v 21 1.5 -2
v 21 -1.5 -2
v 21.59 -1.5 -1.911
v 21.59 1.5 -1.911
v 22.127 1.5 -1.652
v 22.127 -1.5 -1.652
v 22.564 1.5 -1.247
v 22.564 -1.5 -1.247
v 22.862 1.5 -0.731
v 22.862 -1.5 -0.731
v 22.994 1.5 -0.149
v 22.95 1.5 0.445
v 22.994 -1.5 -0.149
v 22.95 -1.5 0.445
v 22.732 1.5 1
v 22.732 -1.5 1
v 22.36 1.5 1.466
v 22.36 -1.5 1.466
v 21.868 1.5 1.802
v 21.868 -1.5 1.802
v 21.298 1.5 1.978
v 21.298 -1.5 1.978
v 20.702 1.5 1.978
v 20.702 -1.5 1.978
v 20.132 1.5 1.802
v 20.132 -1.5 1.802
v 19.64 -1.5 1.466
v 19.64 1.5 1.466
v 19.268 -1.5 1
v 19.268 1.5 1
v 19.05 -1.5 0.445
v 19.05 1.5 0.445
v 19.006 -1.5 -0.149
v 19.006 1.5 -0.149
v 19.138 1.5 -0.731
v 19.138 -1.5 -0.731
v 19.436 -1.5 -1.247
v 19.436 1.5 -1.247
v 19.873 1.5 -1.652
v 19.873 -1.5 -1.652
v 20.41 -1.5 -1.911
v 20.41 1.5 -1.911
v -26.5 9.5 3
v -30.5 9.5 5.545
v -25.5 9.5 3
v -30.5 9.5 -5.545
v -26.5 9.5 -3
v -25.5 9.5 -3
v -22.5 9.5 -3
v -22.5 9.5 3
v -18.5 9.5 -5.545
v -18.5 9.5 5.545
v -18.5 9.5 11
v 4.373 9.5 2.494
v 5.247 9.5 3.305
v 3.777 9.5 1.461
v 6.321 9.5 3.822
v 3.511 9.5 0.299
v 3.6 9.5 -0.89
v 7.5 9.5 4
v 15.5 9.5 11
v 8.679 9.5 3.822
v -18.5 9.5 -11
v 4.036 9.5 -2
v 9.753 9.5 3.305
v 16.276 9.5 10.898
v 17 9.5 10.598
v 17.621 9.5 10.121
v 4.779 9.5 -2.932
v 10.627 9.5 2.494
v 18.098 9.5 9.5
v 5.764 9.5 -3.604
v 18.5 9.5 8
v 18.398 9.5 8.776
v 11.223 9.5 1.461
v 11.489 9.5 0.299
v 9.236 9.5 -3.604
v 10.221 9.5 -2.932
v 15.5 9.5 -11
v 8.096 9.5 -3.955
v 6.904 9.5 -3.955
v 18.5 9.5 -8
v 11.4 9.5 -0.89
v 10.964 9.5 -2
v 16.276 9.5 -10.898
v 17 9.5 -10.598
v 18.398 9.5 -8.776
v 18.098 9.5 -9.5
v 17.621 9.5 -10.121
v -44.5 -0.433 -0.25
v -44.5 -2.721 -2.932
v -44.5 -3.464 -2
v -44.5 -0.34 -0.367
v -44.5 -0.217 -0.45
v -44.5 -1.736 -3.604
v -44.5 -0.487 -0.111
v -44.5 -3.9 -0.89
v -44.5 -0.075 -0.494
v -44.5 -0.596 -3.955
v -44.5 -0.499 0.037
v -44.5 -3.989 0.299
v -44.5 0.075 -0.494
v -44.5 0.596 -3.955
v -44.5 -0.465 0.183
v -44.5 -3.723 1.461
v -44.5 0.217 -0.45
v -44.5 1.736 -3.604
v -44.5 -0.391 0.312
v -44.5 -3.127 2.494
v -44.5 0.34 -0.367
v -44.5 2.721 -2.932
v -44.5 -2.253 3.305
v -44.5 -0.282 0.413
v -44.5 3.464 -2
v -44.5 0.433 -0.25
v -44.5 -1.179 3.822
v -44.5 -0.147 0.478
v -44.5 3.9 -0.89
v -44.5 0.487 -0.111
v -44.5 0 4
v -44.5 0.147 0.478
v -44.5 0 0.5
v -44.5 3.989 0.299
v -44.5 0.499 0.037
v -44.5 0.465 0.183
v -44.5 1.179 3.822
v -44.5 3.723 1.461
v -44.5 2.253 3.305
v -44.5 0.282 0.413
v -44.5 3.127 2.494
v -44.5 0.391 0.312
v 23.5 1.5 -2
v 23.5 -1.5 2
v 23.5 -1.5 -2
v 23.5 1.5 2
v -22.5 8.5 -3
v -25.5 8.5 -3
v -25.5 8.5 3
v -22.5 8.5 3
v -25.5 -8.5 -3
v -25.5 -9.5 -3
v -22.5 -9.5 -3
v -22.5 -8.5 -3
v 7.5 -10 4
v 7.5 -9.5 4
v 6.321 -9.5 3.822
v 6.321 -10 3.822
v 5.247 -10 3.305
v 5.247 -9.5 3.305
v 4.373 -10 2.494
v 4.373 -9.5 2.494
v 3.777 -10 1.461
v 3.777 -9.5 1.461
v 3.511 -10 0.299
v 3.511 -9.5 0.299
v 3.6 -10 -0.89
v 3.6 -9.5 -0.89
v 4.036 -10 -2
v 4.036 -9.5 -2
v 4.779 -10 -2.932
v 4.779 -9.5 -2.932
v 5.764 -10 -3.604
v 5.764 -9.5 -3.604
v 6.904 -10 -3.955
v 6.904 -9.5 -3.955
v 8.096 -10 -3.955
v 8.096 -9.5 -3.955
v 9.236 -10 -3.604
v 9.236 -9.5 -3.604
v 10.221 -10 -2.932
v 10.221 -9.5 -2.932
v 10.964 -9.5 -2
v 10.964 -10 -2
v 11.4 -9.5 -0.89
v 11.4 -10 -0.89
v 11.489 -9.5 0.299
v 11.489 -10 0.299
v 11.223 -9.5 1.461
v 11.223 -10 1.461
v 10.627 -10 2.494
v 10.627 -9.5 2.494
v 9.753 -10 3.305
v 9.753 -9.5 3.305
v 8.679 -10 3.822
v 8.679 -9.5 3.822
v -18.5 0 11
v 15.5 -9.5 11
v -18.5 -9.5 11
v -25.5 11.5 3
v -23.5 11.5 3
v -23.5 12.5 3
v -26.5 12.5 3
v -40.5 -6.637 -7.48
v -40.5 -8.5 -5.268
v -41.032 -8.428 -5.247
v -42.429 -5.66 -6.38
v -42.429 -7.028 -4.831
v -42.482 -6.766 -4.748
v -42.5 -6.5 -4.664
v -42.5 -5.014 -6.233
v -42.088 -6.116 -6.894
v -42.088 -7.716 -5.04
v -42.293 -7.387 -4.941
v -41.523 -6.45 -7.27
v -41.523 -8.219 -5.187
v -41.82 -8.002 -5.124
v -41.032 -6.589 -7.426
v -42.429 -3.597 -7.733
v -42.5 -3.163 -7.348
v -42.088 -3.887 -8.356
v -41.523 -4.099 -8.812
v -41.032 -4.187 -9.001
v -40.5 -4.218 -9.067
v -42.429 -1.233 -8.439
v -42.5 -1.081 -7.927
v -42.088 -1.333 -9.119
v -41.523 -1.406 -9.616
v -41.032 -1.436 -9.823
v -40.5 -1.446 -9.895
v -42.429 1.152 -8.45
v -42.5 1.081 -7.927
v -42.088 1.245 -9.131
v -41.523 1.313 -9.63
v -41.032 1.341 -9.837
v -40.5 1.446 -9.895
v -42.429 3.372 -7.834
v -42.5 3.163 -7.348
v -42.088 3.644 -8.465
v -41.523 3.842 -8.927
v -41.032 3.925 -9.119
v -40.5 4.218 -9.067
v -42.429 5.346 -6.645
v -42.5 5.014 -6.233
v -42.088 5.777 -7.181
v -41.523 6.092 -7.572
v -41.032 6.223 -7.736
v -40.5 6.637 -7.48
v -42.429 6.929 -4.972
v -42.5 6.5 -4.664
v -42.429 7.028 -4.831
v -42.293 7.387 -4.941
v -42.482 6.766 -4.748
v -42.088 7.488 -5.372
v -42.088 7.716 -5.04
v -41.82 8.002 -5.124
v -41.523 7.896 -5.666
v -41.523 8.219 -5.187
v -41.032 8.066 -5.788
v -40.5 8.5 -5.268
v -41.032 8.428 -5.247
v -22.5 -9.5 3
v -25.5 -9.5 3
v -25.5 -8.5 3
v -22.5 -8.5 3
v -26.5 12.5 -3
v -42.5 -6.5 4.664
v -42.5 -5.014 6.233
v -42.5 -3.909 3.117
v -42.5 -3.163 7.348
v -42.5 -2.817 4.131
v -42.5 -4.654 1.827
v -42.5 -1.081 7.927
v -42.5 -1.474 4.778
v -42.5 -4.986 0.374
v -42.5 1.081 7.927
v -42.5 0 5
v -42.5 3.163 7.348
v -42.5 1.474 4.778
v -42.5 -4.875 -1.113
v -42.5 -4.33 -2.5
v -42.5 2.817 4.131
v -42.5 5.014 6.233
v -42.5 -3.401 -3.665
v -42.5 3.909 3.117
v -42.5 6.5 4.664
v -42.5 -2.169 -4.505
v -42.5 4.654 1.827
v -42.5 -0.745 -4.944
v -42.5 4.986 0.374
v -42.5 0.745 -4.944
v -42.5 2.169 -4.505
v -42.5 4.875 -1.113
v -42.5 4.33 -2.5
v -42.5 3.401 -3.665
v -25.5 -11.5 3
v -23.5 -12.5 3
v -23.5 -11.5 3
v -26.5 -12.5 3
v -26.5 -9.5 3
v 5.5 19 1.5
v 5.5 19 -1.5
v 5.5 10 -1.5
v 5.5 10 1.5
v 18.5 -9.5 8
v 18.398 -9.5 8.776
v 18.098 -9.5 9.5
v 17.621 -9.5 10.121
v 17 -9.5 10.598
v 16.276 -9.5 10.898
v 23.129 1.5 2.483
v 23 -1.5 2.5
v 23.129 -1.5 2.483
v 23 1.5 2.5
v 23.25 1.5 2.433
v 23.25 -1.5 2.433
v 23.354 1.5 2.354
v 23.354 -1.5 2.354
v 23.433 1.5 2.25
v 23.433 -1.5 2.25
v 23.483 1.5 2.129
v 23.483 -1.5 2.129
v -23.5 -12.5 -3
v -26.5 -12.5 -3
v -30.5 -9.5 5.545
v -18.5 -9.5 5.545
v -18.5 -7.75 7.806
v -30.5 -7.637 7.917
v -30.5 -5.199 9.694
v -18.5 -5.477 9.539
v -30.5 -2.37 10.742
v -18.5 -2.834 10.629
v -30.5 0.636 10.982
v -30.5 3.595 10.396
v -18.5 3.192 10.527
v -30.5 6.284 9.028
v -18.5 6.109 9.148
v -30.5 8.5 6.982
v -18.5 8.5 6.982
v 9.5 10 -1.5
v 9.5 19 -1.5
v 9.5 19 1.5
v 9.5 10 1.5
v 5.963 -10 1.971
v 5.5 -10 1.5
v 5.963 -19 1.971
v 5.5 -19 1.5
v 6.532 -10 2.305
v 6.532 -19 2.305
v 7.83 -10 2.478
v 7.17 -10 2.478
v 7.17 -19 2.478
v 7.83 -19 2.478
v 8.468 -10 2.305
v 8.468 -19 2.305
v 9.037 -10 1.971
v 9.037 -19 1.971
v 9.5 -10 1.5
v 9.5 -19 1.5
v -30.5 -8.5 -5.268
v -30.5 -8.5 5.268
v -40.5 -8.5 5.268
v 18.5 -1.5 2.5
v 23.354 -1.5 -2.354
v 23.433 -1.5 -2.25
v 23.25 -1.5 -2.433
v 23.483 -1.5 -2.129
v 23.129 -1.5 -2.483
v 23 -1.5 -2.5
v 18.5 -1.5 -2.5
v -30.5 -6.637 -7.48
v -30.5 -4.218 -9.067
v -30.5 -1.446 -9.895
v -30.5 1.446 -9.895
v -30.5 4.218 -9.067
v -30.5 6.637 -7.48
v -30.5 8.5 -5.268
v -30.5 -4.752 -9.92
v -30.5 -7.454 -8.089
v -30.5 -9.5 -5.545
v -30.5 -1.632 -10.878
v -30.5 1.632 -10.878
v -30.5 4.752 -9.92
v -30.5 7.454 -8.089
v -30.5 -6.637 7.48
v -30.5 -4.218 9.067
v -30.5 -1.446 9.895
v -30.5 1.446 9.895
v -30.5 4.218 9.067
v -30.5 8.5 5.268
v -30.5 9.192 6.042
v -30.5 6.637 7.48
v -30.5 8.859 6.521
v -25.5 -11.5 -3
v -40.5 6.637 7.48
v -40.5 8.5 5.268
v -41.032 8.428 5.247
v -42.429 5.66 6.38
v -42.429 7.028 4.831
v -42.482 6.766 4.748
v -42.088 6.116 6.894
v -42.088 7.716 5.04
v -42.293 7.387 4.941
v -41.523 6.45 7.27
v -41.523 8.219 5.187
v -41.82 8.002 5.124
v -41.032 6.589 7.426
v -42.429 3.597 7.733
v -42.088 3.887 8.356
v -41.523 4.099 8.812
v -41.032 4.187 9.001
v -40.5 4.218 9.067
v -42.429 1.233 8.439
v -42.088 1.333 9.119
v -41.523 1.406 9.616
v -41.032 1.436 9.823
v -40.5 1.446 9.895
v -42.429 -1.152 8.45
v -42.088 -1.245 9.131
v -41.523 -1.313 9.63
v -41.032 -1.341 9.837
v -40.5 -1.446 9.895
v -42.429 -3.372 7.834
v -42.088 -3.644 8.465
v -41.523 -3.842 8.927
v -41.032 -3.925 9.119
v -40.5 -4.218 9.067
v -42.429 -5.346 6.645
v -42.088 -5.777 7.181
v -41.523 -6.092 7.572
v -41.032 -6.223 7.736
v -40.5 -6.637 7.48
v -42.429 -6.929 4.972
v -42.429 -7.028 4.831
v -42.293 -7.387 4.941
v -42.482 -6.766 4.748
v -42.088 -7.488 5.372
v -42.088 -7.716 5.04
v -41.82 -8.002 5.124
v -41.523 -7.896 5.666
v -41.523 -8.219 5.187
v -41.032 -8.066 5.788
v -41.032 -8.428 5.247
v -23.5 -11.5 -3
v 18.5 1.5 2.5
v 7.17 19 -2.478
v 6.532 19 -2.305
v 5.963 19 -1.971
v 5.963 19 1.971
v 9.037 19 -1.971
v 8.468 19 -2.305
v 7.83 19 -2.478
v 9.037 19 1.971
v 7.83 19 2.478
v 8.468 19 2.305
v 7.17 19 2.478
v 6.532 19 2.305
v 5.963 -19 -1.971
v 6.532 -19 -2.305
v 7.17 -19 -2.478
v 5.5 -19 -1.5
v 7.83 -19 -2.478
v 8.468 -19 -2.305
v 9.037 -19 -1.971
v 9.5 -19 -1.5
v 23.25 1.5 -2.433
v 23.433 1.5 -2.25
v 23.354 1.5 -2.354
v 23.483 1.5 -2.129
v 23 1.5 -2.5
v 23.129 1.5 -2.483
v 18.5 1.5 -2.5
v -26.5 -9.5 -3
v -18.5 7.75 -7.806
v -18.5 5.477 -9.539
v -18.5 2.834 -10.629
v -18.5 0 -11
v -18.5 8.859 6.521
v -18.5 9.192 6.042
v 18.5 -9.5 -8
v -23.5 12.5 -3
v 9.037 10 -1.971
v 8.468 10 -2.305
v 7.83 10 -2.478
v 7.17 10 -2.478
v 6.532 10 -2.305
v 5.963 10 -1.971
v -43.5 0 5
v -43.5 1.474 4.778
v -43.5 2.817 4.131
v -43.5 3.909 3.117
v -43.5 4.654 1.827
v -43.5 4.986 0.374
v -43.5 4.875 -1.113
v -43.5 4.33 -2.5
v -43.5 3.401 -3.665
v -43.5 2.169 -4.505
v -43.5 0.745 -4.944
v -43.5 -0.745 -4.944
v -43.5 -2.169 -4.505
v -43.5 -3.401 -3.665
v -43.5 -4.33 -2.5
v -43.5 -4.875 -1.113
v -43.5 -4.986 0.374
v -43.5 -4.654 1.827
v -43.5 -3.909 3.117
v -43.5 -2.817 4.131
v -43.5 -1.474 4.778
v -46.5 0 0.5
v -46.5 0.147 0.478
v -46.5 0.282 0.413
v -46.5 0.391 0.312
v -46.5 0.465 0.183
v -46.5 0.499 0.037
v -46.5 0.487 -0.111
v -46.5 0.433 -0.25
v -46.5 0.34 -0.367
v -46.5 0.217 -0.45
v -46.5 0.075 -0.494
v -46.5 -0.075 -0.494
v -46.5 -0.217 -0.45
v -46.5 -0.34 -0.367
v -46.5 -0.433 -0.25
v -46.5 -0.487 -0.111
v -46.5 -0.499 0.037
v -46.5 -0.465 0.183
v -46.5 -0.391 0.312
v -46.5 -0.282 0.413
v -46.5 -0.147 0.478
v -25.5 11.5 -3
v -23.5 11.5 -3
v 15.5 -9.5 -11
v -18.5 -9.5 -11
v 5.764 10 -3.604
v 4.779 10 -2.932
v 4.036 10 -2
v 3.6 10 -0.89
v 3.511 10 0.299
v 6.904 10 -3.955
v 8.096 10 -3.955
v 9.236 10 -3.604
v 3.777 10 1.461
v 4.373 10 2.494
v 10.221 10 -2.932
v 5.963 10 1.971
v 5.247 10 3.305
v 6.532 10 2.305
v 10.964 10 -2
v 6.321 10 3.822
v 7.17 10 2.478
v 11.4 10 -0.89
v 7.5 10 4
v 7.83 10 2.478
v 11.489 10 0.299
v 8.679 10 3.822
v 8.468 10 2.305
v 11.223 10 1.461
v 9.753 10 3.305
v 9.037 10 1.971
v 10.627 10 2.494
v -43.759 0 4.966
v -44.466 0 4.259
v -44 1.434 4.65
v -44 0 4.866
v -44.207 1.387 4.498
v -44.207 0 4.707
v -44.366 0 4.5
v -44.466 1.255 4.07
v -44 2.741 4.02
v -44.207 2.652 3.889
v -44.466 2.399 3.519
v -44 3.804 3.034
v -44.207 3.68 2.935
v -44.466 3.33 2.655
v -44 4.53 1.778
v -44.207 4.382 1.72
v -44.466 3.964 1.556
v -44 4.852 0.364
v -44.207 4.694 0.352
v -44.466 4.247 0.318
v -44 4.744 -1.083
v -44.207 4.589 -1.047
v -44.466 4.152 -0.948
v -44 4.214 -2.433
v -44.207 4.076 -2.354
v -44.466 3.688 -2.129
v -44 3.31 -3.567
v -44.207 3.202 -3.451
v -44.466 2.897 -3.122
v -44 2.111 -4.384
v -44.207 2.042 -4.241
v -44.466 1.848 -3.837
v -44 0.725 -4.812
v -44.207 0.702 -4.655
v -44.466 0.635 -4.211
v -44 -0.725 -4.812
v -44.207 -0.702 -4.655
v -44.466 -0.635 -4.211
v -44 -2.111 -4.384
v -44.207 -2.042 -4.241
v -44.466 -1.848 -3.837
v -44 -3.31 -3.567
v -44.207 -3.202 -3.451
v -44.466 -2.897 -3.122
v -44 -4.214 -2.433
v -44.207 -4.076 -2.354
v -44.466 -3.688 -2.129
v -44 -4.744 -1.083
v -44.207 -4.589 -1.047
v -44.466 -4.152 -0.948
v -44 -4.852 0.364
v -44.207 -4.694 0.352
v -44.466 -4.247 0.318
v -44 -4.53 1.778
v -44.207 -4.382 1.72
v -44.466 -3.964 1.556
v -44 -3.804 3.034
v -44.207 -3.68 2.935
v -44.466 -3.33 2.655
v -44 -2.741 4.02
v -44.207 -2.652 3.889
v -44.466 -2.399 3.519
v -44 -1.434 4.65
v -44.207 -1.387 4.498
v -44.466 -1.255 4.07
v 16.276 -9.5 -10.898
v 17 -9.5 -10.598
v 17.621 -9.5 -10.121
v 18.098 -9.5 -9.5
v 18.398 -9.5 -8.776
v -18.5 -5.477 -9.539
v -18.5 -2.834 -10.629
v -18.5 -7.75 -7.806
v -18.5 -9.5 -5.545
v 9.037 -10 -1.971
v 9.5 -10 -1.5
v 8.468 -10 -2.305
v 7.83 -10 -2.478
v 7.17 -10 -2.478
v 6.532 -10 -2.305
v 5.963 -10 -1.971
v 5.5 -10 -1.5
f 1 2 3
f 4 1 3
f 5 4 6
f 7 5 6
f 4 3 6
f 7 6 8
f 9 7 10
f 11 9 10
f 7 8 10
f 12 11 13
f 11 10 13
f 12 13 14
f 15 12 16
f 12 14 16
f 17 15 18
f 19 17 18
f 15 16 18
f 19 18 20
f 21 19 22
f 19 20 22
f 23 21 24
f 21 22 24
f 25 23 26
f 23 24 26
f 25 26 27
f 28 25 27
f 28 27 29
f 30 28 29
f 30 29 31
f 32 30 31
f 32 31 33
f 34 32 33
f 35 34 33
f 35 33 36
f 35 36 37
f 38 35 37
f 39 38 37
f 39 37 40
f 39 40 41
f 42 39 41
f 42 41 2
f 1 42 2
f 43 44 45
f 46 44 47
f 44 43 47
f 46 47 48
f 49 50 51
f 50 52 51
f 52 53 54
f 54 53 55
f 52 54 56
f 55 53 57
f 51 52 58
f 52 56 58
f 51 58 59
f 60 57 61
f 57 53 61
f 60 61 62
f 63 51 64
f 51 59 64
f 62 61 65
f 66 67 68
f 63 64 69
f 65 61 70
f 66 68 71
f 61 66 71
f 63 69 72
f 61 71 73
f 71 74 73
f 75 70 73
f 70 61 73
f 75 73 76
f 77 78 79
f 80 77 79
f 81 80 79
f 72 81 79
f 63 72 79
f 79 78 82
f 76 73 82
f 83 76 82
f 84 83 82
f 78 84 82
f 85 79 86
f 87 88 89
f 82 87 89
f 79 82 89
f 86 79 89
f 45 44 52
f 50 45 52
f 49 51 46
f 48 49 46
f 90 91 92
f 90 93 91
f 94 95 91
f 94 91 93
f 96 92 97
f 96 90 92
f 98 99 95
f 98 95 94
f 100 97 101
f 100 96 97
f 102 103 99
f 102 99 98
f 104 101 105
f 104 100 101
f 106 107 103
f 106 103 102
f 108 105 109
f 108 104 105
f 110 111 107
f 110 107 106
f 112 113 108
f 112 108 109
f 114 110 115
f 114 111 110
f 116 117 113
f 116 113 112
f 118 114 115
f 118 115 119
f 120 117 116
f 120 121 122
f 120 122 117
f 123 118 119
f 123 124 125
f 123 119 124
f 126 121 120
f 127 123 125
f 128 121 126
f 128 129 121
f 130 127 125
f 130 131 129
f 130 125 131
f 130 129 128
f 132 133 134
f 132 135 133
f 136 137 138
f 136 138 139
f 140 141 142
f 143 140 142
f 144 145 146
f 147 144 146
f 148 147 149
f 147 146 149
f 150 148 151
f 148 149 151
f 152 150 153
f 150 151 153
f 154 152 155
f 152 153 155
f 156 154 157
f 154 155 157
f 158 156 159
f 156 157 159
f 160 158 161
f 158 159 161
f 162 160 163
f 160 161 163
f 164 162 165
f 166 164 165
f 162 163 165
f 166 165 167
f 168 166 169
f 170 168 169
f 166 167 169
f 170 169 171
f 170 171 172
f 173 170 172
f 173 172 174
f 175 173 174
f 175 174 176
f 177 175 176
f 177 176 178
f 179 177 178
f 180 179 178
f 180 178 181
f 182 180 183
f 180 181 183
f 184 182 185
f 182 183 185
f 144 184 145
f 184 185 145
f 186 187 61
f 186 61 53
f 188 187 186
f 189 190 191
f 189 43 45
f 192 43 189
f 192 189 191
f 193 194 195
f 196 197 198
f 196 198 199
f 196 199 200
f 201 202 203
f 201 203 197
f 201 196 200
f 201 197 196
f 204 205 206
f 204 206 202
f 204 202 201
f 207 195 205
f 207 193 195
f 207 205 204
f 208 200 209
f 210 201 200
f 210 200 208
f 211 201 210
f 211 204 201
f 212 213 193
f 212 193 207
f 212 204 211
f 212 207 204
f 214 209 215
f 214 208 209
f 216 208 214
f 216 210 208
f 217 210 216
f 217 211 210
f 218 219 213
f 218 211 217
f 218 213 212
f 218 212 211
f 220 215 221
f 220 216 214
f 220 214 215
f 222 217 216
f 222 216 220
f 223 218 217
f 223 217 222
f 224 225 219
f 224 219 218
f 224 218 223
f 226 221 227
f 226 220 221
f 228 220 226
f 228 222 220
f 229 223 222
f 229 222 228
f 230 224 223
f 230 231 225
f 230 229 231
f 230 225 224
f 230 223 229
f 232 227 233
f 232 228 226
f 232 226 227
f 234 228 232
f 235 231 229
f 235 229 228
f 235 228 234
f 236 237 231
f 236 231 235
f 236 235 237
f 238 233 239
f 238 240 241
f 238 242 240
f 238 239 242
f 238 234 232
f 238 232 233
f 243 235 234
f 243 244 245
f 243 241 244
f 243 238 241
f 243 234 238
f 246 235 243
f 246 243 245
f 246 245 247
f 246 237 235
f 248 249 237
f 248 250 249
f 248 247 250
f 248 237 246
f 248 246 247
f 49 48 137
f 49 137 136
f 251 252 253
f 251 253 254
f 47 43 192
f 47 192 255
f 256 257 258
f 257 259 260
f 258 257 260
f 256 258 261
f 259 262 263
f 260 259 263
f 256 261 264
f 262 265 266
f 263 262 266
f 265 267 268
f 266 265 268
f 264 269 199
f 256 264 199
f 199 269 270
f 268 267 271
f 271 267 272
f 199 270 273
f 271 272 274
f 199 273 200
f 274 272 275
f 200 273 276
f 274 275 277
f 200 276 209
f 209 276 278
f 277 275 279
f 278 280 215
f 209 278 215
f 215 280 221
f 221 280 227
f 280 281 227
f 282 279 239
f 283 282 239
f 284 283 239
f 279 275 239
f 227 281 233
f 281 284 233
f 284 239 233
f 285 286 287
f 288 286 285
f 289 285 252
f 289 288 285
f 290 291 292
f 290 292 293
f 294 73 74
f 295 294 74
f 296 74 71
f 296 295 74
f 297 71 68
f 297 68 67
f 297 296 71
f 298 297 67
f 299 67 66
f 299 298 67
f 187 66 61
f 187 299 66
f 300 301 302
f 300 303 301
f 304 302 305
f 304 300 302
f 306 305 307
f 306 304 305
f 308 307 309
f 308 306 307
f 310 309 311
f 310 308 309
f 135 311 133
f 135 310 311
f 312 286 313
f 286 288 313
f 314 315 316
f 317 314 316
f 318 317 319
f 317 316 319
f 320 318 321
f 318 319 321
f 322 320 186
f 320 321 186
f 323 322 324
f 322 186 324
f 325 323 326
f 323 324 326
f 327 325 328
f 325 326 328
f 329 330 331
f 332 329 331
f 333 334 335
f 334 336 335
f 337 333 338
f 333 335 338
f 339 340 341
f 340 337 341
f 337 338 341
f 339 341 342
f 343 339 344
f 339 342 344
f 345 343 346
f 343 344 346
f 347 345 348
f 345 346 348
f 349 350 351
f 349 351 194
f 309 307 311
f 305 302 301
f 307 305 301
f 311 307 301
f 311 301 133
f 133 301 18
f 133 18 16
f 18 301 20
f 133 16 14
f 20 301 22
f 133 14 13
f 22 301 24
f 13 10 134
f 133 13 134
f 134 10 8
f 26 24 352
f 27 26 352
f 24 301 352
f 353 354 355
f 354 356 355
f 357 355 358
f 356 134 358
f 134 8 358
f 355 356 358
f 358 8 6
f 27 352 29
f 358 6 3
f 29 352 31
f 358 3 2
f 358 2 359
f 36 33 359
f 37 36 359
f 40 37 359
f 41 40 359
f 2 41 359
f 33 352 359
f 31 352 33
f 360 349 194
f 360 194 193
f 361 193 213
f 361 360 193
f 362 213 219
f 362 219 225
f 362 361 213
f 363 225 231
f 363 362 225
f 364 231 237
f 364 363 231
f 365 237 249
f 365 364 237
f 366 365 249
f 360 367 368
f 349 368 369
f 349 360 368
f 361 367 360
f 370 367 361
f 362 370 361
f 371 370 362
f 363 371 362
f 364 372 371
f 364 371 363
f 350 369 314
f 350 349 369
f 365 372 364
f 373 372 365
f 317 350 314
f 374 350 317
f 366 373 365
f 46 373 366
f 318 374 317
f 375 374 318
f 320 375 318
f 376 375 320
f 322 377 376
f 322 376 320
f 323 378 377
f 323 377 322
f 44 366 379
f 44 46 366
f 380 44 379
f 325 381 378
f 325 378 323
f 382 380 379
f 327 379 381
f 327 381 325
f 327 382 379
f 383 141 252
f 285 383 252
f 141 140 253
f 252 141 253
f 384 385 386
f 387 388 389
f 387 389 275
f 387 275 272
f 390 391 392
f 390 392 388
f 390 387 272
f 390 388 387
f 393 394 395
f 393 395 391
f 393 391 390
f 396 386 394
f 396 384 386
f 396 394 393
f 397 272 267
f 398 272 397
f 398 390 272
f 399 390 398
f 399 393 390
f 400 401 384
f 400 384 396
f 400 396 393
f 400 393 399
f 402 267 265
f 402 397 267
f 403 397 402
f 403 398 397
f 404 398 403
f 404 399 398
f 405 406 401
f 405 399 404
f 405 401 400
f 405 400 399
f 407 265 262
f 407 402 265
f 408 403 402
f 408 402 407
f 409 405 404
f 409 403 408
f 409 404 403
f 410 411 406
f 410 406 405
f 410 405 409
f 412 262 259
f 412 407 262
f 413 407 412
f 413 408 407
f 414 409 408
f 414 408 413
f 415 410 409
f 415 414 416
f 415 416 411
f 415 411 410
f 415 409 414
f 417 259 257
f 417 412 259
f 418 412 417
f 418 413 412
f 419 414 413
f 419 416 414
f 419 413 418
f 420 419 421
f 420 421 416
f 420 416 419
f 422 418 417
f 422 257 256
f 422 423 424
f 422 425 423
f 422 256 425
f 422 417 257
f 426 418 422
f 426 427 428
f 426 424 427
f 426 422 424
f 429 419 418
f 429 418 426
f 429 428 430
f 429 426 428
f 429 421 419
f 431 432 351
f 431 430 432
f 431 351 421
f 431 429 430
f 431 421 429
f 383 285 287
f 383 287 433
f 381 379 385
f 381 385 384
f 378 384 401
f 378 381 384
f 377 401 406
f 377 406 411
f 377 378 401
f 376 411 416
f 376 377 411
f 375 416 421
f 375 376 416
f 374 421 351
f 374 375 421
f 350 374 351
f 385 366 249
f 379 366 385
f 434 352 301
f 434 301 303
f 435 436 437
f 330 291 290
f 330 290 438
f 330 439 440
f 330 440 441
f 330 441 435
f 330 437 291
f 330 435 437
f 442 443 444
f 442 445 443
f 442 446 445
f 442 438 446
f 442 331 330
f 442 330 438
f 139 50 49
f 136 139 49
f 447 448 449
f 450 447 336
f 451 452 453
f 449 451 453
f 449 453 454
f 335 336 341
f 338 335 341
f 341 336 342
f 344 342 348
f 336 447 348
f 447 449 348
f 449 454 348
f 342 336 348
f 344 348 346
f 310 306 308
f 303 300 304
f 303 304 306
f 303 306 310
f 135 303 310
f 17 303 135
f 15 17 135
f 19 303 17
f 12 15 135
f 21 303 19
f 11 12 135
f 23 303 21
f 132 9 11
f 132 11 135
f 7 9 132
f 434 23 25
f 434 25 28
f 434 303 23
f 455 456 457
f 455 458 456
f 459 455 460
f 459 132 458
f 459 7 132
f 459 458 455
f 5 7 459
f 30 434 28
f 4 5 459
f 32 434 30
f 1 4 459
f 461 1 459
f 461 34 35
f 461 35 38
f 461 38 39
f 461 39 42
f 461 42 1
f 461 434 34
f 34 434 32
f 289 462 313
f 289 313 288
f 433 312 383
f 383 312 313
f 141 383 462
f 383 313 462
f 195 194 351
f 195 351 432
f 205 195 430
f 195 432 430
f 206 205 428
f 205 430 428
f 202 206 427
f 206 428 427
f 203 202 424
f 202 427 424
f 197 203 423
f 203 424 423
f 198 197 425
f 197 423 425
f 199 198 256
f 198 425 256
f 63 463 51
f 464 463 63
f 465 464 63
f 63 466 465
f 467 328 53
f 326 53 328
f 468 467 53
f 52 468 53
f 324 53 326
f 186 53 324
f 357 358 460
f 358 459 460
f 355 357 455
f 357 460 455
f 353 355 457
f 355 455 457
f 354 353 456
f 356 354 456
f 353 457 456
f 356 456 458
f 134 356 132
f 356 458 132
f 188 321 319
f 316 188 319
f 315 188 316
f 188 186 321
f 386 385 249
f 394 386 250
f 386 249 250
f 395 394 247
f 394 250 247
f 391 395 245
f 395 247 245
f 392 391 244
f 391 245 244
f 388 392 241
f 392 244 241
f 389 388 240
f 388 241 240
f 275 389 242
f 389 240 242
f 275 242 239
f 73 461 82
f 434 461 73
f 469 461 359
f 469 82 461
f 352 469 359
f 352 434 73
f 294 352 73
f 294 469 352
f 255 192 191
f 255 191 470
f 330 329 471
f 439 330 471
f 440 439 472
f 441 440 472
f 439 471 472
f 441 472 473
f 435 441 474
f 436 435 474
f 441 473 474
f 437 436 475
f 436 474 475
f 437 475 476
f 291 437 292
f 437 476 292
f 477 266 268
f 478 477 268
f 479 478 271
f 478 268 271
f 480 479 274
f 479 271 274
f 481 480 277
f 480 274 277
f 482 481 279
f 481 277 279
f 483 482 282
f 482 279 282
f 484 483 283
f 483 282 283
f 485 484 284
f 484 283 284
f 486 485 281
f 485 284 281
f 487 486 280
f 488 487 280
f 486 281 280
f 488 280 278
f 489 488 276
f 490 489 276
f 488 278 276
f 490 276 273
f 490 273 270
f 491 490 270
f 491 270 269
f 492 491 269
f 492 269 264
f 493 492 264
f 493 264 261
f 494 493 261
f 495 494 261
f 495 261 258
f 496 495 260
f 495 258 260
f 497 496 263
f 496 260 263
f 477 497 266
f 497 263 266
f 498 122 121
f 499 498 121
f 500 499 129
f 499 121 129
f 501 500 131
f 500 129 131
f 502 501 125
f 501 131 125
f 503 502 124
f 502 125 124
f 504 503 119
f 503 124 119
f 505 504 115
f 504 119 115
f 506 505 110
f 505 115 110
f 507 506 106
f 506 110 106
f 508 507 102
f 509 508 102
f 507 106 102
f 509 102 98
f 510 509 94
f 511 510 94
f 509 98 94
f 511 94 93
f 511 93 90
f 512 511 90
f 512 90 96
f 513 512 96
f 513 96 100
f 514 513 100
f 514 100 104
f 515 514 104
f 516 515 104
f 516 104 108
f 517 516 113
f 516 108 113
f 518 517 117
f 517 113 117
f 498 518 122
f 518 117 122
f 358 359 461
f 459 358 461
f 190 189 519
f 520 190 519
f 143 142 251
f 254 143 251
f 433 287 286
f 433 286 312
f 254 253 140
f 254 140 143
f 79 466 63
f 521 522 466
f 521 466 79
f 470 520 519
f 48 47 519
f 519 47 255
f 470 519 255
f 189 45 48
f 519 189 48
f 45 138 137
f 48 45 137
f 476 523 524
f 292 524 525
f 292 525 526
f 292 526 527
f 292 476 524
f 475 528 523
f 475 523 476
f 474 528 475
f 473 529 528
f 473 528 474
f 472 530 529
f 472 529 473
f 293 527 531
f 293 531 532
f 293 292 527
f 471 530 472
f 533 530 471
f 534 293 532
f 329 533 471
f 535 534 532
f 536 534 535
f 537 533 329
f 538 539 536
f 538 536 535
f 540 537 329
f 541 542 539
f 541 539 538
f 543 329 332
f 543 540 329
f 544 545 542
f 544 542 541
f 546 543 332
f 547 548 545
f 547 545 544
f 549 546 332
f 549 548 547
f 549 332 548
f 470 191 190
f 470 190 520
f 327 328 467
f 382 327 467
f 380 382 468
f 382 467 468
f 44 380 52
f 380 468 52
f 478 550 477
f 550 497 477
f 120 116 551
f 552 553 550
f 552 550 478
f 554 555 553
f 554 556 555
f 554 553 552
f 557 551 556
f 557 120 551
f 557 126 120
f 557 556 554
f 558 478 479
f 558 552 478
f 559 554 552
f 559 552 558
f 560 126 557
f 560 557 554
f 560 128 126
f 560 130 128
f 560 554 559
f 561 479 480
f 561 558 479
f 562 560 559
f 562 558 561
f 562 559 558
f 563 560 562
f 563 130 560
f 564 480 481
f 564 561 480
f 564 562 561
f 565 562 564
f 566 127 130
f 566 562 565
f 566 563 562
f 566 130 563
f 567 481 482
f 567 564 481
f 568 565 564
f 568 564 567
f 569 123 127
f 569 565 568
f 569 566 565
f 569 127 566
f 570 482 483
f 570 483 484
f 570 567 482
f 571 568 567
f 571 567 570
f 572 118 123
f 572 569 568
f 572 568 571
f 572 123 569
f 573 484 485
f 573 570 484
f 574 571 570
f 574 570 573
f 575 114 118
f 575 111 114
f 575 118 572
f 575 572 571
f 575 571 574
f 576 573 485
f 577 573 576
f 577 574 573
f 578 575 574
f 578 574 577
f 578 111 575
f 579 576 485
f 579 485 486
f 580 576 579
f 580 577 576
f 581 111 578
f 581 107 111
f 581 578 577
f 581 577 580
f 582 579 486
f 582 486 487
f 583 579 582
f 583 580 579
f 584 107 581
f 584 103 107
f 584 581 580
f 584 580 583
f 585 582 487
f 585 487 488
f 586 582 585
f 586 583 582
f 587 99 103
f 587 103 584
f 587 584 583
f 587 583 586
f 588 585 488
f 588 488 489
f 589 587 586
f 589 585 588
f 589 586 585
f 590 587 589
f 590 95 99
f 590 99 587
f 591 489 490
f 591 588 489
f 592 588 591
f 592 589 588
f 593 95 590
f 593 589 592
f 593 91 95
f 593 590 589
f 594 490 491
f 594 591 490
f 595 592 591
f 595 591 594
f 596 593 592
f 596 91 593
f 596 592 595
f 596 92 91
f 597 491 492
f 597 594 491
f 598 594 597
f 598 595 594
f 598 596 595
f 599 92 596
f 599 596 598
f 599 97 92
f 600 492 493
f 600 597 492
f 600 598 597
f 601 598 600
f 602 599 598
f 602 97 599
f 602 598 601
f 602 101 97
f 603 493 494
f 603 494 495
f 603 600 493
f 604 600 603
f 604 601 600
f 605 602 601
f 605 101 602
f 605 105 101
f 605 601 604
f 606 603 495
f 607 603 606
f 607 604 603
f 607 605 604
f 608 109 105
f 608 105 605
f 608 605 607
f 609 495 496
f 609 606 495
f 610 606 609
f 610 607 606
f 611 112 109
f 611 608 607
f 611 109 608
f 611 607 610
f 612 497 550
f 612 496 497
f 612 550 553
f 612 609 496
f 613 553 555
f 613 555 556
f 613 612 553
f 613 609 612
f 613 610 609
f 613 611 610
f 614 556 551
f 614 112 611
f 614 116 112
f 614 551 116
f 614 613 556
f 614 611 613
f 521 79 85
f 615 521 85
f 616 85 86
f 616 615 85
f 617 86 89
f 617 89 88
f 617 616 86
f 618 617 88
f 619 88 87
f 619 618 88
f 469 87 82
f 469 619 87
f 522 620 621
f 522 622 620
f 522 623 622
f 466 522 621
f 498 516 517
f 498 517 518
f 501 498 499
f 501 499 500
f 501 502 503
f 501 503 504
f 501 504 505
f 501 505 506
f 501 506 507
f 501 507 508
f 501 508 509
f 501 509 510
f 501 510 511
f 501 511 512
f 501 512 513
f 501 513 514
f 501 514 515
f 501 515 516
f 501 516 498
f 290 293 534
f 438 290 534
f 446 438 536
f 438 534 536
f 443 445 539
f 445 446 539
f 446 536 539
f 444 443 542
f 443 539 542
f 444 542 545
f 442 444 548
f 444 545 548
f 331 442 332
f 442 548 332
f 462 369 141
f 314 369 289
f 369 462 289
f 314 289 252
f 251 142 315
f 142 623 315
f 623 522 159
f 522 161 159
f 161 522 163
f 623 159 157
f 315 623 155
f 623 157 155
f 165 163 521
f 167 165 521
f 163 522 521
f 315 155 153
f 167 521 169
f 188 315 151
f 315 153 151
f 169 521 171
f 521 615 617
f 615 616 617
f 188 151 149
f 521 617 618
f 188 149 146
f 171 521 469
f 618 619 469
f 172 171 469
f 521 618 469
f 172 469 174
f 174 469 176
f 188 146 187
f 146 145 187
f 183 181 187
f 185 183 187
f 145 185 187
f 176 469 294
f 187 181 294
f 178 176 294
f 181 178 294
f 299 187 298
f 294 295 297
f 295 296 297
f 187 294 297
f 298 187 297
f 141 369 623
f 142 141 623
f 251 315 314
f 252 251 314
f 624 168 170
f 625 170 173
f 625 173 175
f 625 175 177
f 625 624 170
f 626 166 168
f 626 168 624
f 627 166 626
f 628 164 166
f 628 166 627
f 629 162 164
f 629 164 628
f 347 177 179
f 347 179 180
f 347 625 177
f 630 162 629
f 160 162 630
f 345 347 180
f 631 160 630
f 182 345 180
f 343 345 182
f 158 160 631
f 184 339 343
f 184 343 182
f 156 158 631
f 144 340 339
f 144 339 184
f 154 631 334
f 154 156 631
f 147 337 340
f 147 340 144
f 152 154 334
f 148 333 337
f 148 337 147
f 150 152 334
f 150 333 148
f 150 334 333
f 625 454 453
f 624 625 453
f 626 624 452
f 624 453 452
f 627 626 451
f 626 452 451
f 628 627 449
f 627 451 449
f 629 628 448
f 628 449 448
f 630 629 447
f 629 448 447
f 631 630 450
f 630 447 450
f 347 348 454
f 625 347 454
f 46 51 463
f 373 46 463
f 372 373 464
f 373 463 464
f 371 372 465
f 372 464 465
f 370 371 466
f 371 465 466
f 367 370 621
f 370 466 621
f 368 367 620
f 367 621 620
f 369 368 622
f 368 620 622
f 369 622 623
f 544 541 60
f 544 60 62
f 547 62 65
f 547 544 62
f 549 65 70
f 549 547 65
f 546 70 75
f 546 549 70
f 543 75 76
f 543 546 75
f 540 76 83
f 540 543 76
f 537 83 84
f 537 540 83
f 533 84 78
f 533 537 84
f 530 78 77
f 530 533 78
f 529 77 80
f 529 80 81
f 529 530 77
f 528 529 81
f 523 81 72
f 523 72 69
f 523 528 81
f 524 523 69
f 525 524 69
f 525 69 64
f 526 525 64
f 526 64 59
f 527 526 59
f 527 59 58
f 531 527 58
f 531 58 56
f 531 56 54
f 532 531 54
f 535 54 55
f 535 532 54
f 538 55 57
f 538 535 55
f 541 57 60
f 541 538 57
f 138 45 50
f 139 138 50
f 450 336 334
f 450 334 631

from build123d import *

# Parameters (mm, degrees)
Y_KSEKLIK_EKSTR_ZYON1_DEPTH      = 9.5
Y_KSEKLIK_EKSTR_ZYON1_DEPTH_BACK = 9.5
IZIM7_R                          = 2.5
KES_EKSTR_ZYON2_DEPTH            = 19
Y_KSEKLIK_EKSTR_ZYON7_START      = 0.5
IZIM8_R                          = 4
IZIM8_R_2                        = 2.5
Y_KSEKLIK_EKSTR_ZYON7_DEPTH      = 0.5
IZIM9_R                          = 4
IZIM9_R_2                        = 2.5
Y_KSEKLIK_EKSTR_ZYON8_DEPTH      = 0.5
Y_KSEKLIK_EKSTR_ZYON9_DEPTH      = 19
Y_KSEKLIK_EKSTR_ZYON9_DEPTH_BACK = 19
IZIM10_R                         = 2.5
KES_EKSTR_ZYON4_DEPTH            = 9
KES_EKSTR_ZYON5_DEPTH            = 9
IZIM13_W                         = 5
IZIM13_H                         = 3
Y_KSEKLIK_EKSTR_ZYON10_DEPTH     = 5
IZIM14_R                         = 2
KES_EKSTR_ZYON6_DEPTH            = 5
RADYUS3_R                        = 0.5
Y_KSEKLIK_EKSTR_ZYON11_DEPTH     = 12
Y_KSEKLIK_EKSTR_ZYON12_DEPTH     = 19
Y_KSEKLIK_EKSTR_ZYON13_DEPTH     = 5
RADYUS4_R                        = 2
IZIM18_R                         = 5
Y_KSEKLIK_EKSTR_ZYON14_DEPTH     = 2
RADYUS5_R                        = 1
IZIM19_R                         = 0.5
Y_KSEKLIK_EKSTR_ZYON15_DEPTH     = 2
IZIM20_W                         = 3
IZIM20_H                         = 6
KES_EKSTR_ZYON7_DEPTH            = 1
IZIM21_W                         = 3
IZIM21_H                         = 6
KES_EKSTR_ZYON8_DEPTH            = 1
IZIM22_W                         = 1
IZIM22_H                         = 6
Y_KSEKLIK_EKSTR_ZYON17_DEPTH     = 3
IZIM23_W                         = 6
IZIM23_H                         = 1
Y_KSEKLIK_EKSTR_ZYON18_DEPTH     = 2
IZIM24_W                         = 1
IZIM24_H                         = 6
Y_KSEKLIK_EKSTR_ZYON19_DEPTH     = 3
IZIM25_W                         = 6
IZIM25_H                         = 1
Y_KSEKLIK_EKSTR_ZYON20_DEPTH     = 2


with BuildPart() as part:
    # Çizim1 → Yükseklik-Ekstrüzyon1 (new, two sides: drawn at the far end of the back side and taken through both)
    with BuildSketch(Plane(origin=(0, 0, 0), x_dir=(1, 0, 0), z_dir=(0, 1, 0)).offset(-Y_KSEKLIK_EKSTR_ZYON1_DEPTH_BACK)):
        with BuildLine():
            Line((-18.5, 11), (15.5, 11))
            ThreePointArc((15.5, 11), (17.621320344, 10.121320344), (18.5, 8))
            Line((18.5, 8), (18.5, -8))
            ThreePointArc((18.5, -8), (17.621320344, -10.121320344), (15.5, -11))
            Line((15.5, -11), (-18.5, -11))
            Line((-18.5, -11), (-18.5, 11))
        make_face()
    extrude(amount=Y_KSEKLIK_EKSTR_ZYON1_DEPTH + Y_KSEKLIK_EKSTR_ZYON1_DEPTH_BACK)

    # Çizim7 → Kes-Ekstrüzyon2 (cut)
    with BuildSketch(Plane(origin=(0, 9.5, 0), x_dir=(1, 0, 0), z_dir=(0, 1, 0))):
        with Locations(Location((7.5, 0, 0), (0, 0, 270))):
            Circle(IZIM7_R)
    extrude(amount=-KES_EKSTR_ZYON2_DEPTH, mode=Mode.SUBTRACT)

    # Çizim8 → Yükseklik-Ekstrüzyon7 (add)
    with BuildSketch(Plane(origin=(0, 9.5, 0), x_dir=(1, 0, 0), z_dir=(0, 1, 0)).offset(Y_KSEKLIK_EKSTR_ZYON7_START)):
        with Locations(Location((7.5, 0, 0), (0, 0, 270))):
            Circle(IZIM8_R)
        with Locations(Location((7.5, 0, 0), (0, 0, 270))):
            Circle(IZIM8_R_2, mode=Mode.SUBTRACT)
    extrude(amount=-Y_KSEKLIK_EKSTR_ZYON7_DEPTH)

    # Çizim9 → Yükseklik-Ekstrüzyon8 (add)
    with BuildSketch(Plane.XZ.offset(9.5)):
        with Locations(Location((7.5, 0, 0), (0, 0, 90))):
            Circle(IZIM9_R)
        with Locations(Location((7.5, 0, 0), (0, 0, 90))):
            Circle(IZIM9_R_2, mode=Mode.SUBTRACT)
    extrude(amount=Y_KSEKLIK_EKSTR_ZYON8_DEPTH)

    # Çizim10 → Yükseklik-Ekstrüzyon9 (add, two sides: drawn at the far end of the back side and taken through both)
    with BuildSketch(Plane(origin=(0, 0, 0), x_dir=(1, 0, 0), z_dir=(0, 1, 0)).offset(-Y_KSEKLIK_EKSTR_ZYON9_DEPTH_BACK)):
        with Locations(Location((7.5, 0, 0), (0, 0, 270))):
            Circle(IZIM10_R)
    extrude(amount=Y_KSEKLIK_EKSTR_ZYON9_DEPTH + Y_KSEKLIK_EKSTR_ZYON9_DEPTH_BACK)

    # Çizim11 → Kes-Ekstrüzyon4 (cut)
    with BuildSketch(Plane(origin=(0, 19, 0), x_dir=(1, 0, 0), z_dir=(0, 1, 0))):
        with BuildLine():
            Line((5.5, 1.5), (5.5, -1.5))
            ThreePointArc((5.5, -1.5), (5, 0), (5.5, 1.5))
        make_face()
        with BuildLine():
            Line((9.5, 1.5), (9.5, -1.5))
            ThreePointArc((9.5, -1.5), (10, 0), (9.5, 1.5))
        make_face()
    extrude(amount=-KES_EKSTR_ZYON4_DEPTH, mode=Mode.SUBTRACT)

    # Çizim12 → Kes-Ekstrüzyon5 (cut)
    with BuildSketch(Plane.XZ.offset(19)):
        with BuildLine():
            Line((5.5, 1.5), (5.5, -1.5))
            ThreePointArc((5.5, -1.5), (5, 0), (5.5, 1.5))
        make_face()
        with BuildLine():
            Line((9.5, 1.5), (9.5, -1.5))
            ThreePointArc((9.5, -1.5), (10, 0), (9.5, 1.5))
        make_face()
    extrude(amount=-KES_EKSTR_ZYON5_DEPTH, mode=Mode.SUBTRACT)

    # Çizim13 → Yükseklik-Ekstrüzyon10 (add)
    with BuildSketch(Plane(origin=(18.5, 0, 0), x_dir=(0, 0, -1), z_dir=(1, 0, 0))):
        Rectangle(IZIM13_W, IZIM13_H)
    extrude(amount=Y_KSEKLIK_EKSTR_ZYON10_DEPTH)

    # Çizim14 → Kes-Ekstrüzyon6 (cut)
    with BuildSketch(Plane.XZ.offset(1.5)):
        with Locations(Location((21, 0, 0), (0, 0, 270))):
            Circle(IZIM14_R)
    extrude(amount=-KES_EKSTR_ZYON6_DEPTH, mode=Mode.SUBTRACT)

    # Radyus3
    radyus3_edges = [part.edges().sort_by_distance(p)[0] for p in [
        (23.5, 0, -2.5),
        (23.5, 0, 2.5),
    ]]
    fillet(radyus3_edges, radius=RADYUS3_R)

    # Çizim15 → Yükseklik-Ekstrüzyon11 (add)
    with BuildSketch(Plane.ZY.offset(18.5)):
        with BuildLine():
            Line((5.545268253, 9.5), (-5.545268253, 9.5))
            ThreePointArc((-5.545268253, 9.5), (-11, 0), (-5.545268253, -9.5))
            Line((-5.545268253, -9.5), (5.545268253, -9.5))
            ThreePointArc((5.545268253, -9.5), (10.965120348, -0.875291809), (6.982120022, 8.5))
            ThreePointArc((6.982120022, 8.5), (6.283618722, 9.028628675), (5.545268253, 9.5))
        make_face()
        with BuildLine():
            ThreePointArc((-5.267826876, -8.5), (-10, 0), (-5.267826876, 8.5))
            Line((-5.267826876, 8.5), (5.267826876, 8.5))
            ThreePointArc((5.267826876, 8.5), (10, 0), (5.267826876, -8.5))
            Line((5.267826876, -8.5), (-5.267826876, -8.5))
        make_face(mode=Mode.SUBTRACT)
    extrude(amount=Y_KSEKLIK_EKSTR_ZYON11_DEPTH)

    # Çizim16 → Yükseklik-Ekstrüzyon12 (add)
    with BuildSketch(Plane.ZY.offset(18.5)):
        with BuildLine():
            Line((-5.267826876, 8.5), (5.267826876, 8.5))
            ThreePointArc((5.267826876, 8.5), (10, 0), (5.267826876, -8.5))
            Line((5.267826876, -8.5), (-5.267826876, -8.5))
            ThreePointArc((-5.267826876, -8.5), (-10, 0), (-5.267826876, 8.5))
        make_face()
    extrude(amount=Y_KSEKLIK_EKSTR_ZYON12_DEPTH)

    # Çizim17 → Yükseklik-Ekstrüzyon13 (add)
    with BuildSketch(Plane.ZY.offset(37.5)):
        with BuildLine():
            Line((-5.267826876, 8.5), (5.267826876, 8.5))
            ThreePointArc((5.267826876, 8.5), (10, 0), (5.267826876, -8.5))
            Line((5.267826876, -8.5), (-5.267826876, -8.5))
            ThreePointArc((-5.267826876, -8.5), (-10, 0), (-5.267826876, 8.5))
        make_face()
    extrude(amount=Y_KSEKLIK_EKSTR_ZYON13_DEPTH)

    # Radyus4
    # the kernel refuses this fillet: 2 mm, written as the material it takes off along each edge
    with BuildSketch(Plane(origin=(-42.5, 0, 0), x_dir=(0, -0.9985166114955222, -0.05444792528187306), z_dir=(0, -0.05444792528187306, 0.9985166114955222))) as radyus4_piece_1:
        with BuildLine():
            CenterArc((10 - RADYUS4_R, RADYUS4_R), RADYUS4_R, 270, 90)
            Line((10, RADYUS4_R), (10, 0))
            Line((10, 0), (10 - RADYUS4_R, 0))
        make_face()
    revolve(axis=Axis((-42.5, 0, 0), (1, 0, 0)), revolution_arc=173.757640436, mode=Mode.SUBTRACT)
    with BuildSketch(Plane(origin=(-42.5, -8.5, 10.267826876), x_dir=(1, 0, 0), z_dir=(0, 0, -1))) as radyus4_piece_2:
        with BuildLine():
            CenterArc((RADYUS4_R, -RADYUS4_R), RADYUS4_R, 90, 90)
            Line((0, -RADYUS4_R), (0, 0))
            Line((0, 0), (RADYUS4_R, 0))
        make_face()
    extrude(amount=20.535653753, mode=Mode.SUBTRACT)
    with BuildSketch(Plane(origin=(-42.5, 0, 0), x_dir=(0, 0.9985166114955222, 0.05444792528187289), z_dir=(0, 0.05444792528187289, -0.9985166114955222))) as radyus4_piece_3:
        with BuildLine():
            CenterArc((10 - RADYUS4_R, RADYUS4_R), RADYUS4_R, 270, 90)
            Line((10, RADYUS4_R), (10, 0))
            Line((10, 0), (10 - RADYUS4_R, 0))
        make_face()
    revolve(axis=Axis((-42.5, 0, 0), (1, 0, 0)), revolution_arc=173.757640436, mode=Mode.SUBTRACT)
    with BuildSketch(Plane(origin=(-42.5, 8.5, -10.267826876), x_dir=(0, -1, 0), z_dir=(0, 0, 1))) as radyus4_piece_4:
        with BuildLine():
            CenterArc((RADYUS4_R, RADYUS4_R), RADYUS4_R, 180, 90)
            Line((0, RADYUS4_R), (0, 0))
            Line((0, 0), (RADYUS4_R, 0))
        make_face()
    extrude(amount=20.535653753, mode=Mode.SUBTRACT)

    # Çizim18 → Yükseklik-Ekstrüzyon14 (add)
    with BuildSketch(Plane.ZY.offset(42.5)):
        Circle(IZIM18_R)
    extrude(amount=Y_KSEKLIK_EKSTR_ZYON14_DEPTH)

    # Radyus5
    radyus5_edges = [part.edges().sort_by_distance(p)[0] for p in [
        (-44.5, 0, -5),
    ]]
    fillet(radyus5_edges, radius=RADYUS5_R)

    # Çizim19 → Yükseklik-Ekstrüzyon15 (add)
    with BuildSketch(Plane.ZY.offset(44.5)):
        Circle(IZIM19_R)
    extrude(amount=Y_KSEKLIK_EKSTR_ZYON15_DEPTH)

    # Çizim20 → Kes-Ekstrüzyon7 (cut)
    with BuildSketch(Plane(origin=(0, 9.5, 0), x_dir=(1, 0, 0), z_dir=(0, 1, 0))):
        with Locations((-24, 0)):
            Rectangle(IZIM20_W, IZIM20_H)
    extrude(amount=-KES_EKSTR_ZYON7_DEPTH, mode=Mode.SUBTRACT)

    # Çizim21 → Kes-Ekstrüzyon8 (cut)
    with BuildSketch(Plane.XZ.offset(9.5)):
        with Locations((-24, 0)):
            Rectangle(IZIM21_W, IZIM21_H)
    extrude(amount=-KES_EKSTR_ZYON8_DEPTH, mode=Mode.SUBTRACT)

    # Çizim22 → Yükseklik-Ekstrüzyon17 (add)
    with BuildSketch(Plane.XZ.offset(9.5)):
        with Locations((-26, 0)):
            Rectangle(IZIM22_W, IZIM22_H)
    extrude(amount=Y_KSEKLIK_EKSTR_ZYON17_DEPTH)

    # Çizim23 → Yükseklik-Ekstrüzyon18 (add)
    with BuildSketch(Plane(origin=(-25.5, 0, 0), x_dir=(0, 0, -1), z_dir=(1, 0, 0))):
        with Locations((0, -12)):
            Rectangle(IZIM23_W, IZIM23_H)
    extrude(amount=Y_KSEKLIK_EKSTR_ZYON18_DEPTH)

    # Çizim24 → Yükseklik-Ekstrüzyon19 (add)
    with BuildSketch(Plane(origin=(0, 9.5, 0), x_dir=(1, 0, 0), z_dir=(0, 1, 0))):
        with Locations((-26, 0)):
            Rectangle(IZIM24_W, IZIM24_H)
    extrude(amount=Y_KSEKLIK_EKSTR_ZYON19_DEPTH)

    # Çizim25 → Yükseklik-Ekstrüzyon20 (add)
    with BuildSketch(Plane(origin=(-25.5, 0, 0), x_dir=(0, 0, -1), z_dir=(1, 0, 0))):
        with Locations((0, 12)):
            Rectangle(IZIM25_W, IZIM25_H)
    extrude(amount=Y_KSEKLIK_EKSTR_ZYON20_DEPTH)


solid = part.part
